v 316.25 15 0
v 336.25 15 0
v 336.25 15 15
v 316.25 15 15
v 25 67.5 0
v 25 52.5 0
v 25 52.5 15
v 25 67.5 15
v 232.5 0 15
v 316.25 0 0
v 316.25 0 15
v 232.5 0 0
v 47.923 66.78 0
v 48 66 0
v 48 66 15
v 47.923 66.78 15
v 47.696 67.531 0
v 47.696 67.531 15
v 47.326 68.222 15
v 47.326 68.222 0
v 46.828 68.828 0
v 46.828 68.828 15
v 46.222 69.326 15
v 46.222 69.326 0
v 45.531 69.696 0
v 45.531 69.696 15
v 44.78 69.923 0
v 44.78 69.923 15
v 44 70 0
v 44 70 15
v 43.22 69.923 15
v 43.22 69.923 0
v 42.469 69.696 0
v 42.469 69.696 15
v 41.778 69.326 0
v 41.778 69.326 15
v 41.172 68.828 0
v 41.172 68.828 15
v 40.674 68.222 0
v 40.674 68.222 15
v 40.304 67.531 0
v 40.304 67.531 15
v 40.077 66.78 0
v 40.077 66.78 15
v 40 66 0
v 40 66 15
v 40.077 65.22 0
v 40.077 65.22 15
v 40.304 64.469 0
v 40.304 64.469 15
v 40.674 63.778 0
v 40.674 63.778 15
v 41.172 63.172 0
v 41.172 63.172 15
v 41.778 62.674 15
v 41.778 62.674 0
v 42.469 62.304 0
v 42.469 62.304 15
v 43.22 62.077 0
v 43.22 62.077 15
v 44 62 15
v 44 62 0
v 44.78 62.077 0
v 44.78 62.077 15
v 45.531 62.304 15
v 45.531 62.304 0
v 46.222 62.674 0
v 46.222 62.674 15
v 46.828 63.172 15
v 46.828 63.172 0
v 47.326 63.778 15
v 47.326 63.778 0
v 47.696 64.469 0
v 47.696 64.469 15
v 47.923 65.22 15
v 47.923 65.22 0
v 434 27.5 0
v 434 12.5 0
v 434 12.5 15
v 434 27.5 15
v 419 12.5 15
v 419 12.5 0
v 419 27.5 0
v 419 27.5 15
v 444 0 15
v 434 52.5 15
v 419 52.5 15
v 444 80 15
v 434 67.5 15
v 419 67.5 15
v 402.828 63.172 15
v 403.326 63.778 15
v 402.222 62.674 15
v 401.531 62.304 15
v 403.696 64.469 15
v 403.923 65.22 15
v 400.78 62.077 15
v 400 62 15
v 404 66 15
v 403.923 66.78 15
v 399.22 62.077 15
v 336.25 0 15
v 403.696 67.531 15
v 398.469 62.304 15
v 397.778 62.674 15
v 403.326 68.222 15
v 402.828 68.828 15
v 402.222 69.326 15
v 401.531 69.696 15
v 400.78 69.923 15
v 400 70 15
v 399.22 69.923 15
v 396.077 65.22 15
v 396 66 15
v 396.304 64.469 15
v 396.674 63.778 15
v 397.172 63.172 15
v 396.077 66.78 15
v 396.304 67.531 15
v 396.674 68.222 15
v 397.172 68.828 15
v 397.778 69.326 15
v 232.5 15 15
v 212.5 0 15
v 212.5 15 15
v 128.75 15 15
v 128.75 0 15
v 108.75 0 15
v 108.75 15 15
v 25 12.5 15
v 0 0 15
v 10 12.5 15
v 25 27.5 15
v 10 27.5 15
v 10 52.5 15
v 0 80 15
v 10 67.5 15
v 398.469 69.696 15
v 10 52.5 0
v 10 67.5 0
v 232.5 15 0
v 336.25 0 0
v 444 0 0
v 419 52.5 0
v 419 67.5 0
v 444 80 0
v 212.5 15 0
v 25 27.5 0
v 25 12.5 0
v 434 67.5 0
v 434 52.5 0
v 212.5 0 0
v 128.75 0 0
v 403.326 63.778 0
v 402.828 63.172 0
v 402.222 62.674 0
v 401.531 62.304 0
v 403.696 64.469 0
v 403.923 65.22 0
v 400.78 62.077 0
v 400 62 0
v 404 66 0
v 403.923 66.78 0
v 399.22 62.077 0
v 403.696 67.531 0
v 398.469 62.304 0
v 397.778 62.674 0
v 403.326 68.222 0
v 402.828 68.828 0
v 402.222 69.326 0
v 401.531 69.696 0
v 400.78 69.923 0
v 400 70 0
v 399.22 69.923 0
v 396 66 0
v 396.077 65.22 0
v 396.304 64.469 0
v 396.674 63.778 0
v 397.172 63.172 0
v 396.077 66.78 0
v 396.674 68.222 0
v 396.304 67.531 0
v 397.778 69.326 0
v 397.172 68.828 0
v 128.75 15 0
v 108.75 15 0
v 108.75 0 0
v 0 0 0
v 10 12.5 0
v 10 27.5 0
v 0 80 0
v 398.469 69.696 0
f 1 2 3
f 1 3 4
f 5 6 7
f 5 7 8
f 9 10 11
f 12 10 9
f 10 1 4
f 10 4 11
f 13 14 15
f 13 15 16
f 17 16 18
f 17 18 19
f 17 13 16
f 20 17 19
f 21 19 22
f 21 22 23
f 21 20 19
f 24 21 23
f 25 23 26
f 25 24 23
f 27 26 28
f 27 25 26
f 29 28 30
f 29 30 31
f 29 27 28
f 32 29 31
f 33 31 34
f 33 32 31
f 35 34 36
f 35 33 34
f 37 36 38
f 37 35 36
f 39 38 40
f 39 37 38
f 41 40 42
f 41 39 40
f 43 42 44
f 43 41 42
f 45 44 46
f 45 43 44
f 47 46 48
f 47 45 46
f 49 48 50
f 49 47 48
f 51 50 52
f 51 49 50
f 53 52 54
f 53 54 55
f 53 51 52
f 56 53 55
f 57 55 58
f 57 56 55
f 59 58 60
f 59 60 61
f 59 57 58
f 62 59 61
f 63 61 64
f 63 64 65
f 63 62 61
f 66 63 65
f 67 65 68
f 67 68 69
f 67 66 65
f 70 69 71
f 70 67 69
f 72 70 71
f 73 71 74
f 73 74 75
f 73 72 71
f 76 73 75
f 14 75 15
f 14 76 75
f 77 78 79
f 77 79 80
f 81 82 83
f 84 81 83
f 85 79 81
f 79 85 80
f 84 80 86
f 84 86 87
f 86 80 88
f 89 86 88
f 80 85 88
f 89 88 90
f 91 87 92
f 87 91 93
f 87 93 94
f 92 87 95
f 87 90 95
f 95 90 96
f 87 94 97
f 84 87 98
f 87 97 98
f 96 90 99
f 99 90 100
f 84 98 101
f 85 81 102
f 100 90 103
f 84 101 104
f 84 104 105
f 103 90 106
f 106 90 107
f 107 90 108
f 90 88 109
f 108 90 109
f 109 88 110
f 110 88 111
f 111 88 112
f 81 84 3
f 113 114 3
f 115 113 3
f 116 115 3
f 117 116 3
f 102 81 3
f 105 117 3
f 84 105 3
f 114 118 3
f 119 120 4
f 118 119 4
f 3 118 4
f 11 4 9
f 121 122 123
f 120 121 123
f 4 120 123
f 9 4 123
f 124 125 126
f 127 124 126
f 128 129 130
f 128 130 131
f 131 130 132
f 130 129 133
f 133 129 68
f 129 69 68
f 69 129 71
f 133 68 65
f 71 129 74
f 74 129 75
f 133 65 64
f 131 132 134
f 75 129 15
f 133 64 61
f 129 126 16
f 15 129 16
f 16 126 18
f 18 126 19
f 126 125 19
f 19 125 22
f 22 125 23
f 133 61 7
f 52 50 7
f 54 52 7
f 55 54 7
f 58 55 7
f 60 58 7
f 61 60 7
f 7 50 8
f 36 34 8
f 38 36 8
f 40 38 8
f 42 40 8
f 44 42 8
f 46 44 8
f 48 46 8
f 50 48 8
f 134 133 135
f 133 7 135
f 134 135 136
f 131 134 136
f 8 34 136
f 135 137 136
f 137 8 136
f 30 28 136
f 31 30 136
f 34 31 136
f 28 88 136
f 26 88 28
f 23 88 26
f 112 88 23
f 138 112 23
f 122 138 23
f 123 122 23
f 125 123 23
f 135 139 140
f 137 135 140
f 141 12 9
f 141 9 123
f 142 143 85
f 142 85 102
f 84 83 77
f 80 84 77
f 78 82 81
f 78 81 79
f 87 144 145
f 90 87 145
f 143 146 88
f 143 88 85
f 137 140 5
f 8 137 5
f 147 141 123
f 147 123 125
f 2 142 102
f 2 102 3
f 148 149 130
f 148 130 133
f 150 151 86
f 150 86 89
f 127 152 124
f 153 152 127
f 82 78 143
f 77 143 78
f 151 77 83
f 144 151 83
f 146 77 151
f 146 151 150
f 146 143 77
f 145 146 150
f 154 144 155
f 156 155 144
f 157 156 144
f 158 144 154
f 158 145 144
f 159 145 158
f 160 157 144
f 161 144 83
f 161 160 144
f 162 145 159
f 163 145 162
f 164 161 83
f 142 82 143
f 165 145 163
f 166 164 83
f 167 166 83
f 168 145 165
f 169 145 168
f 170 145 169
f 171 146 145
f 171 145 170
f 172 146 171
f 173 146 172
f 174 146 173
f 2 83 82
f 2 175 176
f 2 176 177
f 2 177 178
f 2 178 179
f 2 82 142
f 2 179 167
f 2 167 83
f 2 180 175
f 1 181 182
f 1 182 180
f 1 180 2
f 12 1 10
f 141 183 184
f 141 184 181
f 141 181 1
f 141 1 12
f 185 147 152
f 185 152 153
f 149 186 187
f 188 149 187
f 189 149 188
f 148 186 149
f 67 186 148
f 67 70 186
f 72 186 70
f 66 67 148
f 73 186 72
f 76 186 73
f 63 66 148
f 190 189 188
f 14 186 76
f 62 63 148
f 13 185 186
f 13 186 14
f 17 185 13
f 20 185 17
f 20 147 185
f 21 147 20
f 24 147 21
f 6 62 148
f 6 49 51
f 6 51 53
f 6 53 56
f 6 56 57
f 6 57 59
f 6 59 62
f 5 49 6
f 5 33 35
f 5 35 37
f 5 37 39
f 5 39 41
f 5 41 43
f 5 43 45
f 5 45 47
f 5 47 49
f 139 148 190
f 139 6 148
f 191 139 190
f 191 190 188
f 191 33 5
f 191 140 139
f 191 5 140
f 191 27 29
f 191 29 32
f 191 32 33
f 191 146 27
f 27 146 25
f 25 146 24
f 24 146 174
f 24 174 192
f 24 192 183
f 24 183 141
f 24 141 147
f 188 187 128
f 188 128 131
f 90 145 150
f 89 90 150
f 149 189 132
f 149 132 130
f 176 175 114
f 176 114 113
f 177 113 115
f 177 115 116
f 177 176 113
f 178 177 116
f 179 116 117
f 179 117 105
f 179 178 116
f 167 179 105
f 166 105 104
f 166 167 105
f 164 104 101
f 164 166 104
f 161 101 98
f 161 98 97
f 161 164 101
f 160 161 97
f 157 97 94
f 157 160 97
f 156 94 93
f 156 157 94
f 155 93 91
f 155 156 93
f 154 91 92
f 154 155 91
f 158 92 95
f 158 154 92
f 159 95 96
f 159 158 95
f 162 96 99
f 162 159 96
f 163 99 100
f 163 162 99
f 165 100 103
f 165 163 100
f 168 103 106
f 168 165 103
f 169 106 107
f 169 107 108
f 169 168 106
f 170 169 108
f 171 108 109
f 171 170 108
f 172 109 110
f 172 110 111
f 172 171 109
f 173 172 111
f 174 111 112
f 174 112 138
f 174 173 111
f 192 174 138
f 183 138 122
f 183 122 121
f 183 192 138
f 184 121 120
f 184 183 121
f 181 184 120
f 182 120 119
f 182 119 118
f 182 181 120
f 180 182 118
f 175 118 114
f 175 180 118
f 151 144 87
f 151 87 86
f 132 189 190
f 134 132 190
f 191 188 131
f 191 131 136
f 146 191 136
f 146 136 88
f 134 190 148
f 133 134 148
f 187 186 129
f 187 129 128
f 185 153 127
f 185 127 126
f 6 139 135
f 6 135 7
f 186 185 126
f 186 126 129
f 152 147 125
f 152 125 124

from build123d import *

# Parameters (mm, degrees)
SKETCH1_R           = 4
SKETCH1_W           = 15
SKETCH1_H           = 15
BOSS_EXTRUDE1_DEPTH = 15


with BuildPart() as part:
    # Sketch1 → Boss-Extrude1 (new body)
    with BuildSketch(Plane.XY):
        Polygon((0, 0), (0, 80), (444, 80), (444, 0), (336.25, 0), (336.25, 15), (316.25, 15), (316.25, 0), (232.5, 0), (232.5, 15), (212.5, 15), (212.5, 0), (128.75, 0), (128.75, 15), (108.75, 15), (108.75, 0), align=None)
        with Locations((44, 66)):
            Circle(SKETCH1_R, mode=Mode.SUBTRACT)
        with Locations(Location((400, 66, 0), (0, 0, 180))):  # turned: the seam where the file's is
            Circle(SKETCH1_R, mode=Mode.SUBTRACT)
        with Locations((17.5, 60)):
            Rectangle(SKETCH1_W, SKETCH1_H, mode=Mode.SUBTRACT)
        with Locations((17.5, 20)):
            Rectangle(SKETCH1_W, SKETCH1_H, mode=Mode.SUBTRACT)
        with Locations((426.5, 20)):
            Rectangle(SKETCH1_W, SKETCH1_H, mode=Mode.SUBTRACT)
        with Locations((426.5, 60)):
            Rectangle(SKETCH1_W, SKETCH1_H, mode=Mode.SUBTRACT)
    extrude(amount=BOSS_EXTRUDE1_DEPTH)


solid = part.part
